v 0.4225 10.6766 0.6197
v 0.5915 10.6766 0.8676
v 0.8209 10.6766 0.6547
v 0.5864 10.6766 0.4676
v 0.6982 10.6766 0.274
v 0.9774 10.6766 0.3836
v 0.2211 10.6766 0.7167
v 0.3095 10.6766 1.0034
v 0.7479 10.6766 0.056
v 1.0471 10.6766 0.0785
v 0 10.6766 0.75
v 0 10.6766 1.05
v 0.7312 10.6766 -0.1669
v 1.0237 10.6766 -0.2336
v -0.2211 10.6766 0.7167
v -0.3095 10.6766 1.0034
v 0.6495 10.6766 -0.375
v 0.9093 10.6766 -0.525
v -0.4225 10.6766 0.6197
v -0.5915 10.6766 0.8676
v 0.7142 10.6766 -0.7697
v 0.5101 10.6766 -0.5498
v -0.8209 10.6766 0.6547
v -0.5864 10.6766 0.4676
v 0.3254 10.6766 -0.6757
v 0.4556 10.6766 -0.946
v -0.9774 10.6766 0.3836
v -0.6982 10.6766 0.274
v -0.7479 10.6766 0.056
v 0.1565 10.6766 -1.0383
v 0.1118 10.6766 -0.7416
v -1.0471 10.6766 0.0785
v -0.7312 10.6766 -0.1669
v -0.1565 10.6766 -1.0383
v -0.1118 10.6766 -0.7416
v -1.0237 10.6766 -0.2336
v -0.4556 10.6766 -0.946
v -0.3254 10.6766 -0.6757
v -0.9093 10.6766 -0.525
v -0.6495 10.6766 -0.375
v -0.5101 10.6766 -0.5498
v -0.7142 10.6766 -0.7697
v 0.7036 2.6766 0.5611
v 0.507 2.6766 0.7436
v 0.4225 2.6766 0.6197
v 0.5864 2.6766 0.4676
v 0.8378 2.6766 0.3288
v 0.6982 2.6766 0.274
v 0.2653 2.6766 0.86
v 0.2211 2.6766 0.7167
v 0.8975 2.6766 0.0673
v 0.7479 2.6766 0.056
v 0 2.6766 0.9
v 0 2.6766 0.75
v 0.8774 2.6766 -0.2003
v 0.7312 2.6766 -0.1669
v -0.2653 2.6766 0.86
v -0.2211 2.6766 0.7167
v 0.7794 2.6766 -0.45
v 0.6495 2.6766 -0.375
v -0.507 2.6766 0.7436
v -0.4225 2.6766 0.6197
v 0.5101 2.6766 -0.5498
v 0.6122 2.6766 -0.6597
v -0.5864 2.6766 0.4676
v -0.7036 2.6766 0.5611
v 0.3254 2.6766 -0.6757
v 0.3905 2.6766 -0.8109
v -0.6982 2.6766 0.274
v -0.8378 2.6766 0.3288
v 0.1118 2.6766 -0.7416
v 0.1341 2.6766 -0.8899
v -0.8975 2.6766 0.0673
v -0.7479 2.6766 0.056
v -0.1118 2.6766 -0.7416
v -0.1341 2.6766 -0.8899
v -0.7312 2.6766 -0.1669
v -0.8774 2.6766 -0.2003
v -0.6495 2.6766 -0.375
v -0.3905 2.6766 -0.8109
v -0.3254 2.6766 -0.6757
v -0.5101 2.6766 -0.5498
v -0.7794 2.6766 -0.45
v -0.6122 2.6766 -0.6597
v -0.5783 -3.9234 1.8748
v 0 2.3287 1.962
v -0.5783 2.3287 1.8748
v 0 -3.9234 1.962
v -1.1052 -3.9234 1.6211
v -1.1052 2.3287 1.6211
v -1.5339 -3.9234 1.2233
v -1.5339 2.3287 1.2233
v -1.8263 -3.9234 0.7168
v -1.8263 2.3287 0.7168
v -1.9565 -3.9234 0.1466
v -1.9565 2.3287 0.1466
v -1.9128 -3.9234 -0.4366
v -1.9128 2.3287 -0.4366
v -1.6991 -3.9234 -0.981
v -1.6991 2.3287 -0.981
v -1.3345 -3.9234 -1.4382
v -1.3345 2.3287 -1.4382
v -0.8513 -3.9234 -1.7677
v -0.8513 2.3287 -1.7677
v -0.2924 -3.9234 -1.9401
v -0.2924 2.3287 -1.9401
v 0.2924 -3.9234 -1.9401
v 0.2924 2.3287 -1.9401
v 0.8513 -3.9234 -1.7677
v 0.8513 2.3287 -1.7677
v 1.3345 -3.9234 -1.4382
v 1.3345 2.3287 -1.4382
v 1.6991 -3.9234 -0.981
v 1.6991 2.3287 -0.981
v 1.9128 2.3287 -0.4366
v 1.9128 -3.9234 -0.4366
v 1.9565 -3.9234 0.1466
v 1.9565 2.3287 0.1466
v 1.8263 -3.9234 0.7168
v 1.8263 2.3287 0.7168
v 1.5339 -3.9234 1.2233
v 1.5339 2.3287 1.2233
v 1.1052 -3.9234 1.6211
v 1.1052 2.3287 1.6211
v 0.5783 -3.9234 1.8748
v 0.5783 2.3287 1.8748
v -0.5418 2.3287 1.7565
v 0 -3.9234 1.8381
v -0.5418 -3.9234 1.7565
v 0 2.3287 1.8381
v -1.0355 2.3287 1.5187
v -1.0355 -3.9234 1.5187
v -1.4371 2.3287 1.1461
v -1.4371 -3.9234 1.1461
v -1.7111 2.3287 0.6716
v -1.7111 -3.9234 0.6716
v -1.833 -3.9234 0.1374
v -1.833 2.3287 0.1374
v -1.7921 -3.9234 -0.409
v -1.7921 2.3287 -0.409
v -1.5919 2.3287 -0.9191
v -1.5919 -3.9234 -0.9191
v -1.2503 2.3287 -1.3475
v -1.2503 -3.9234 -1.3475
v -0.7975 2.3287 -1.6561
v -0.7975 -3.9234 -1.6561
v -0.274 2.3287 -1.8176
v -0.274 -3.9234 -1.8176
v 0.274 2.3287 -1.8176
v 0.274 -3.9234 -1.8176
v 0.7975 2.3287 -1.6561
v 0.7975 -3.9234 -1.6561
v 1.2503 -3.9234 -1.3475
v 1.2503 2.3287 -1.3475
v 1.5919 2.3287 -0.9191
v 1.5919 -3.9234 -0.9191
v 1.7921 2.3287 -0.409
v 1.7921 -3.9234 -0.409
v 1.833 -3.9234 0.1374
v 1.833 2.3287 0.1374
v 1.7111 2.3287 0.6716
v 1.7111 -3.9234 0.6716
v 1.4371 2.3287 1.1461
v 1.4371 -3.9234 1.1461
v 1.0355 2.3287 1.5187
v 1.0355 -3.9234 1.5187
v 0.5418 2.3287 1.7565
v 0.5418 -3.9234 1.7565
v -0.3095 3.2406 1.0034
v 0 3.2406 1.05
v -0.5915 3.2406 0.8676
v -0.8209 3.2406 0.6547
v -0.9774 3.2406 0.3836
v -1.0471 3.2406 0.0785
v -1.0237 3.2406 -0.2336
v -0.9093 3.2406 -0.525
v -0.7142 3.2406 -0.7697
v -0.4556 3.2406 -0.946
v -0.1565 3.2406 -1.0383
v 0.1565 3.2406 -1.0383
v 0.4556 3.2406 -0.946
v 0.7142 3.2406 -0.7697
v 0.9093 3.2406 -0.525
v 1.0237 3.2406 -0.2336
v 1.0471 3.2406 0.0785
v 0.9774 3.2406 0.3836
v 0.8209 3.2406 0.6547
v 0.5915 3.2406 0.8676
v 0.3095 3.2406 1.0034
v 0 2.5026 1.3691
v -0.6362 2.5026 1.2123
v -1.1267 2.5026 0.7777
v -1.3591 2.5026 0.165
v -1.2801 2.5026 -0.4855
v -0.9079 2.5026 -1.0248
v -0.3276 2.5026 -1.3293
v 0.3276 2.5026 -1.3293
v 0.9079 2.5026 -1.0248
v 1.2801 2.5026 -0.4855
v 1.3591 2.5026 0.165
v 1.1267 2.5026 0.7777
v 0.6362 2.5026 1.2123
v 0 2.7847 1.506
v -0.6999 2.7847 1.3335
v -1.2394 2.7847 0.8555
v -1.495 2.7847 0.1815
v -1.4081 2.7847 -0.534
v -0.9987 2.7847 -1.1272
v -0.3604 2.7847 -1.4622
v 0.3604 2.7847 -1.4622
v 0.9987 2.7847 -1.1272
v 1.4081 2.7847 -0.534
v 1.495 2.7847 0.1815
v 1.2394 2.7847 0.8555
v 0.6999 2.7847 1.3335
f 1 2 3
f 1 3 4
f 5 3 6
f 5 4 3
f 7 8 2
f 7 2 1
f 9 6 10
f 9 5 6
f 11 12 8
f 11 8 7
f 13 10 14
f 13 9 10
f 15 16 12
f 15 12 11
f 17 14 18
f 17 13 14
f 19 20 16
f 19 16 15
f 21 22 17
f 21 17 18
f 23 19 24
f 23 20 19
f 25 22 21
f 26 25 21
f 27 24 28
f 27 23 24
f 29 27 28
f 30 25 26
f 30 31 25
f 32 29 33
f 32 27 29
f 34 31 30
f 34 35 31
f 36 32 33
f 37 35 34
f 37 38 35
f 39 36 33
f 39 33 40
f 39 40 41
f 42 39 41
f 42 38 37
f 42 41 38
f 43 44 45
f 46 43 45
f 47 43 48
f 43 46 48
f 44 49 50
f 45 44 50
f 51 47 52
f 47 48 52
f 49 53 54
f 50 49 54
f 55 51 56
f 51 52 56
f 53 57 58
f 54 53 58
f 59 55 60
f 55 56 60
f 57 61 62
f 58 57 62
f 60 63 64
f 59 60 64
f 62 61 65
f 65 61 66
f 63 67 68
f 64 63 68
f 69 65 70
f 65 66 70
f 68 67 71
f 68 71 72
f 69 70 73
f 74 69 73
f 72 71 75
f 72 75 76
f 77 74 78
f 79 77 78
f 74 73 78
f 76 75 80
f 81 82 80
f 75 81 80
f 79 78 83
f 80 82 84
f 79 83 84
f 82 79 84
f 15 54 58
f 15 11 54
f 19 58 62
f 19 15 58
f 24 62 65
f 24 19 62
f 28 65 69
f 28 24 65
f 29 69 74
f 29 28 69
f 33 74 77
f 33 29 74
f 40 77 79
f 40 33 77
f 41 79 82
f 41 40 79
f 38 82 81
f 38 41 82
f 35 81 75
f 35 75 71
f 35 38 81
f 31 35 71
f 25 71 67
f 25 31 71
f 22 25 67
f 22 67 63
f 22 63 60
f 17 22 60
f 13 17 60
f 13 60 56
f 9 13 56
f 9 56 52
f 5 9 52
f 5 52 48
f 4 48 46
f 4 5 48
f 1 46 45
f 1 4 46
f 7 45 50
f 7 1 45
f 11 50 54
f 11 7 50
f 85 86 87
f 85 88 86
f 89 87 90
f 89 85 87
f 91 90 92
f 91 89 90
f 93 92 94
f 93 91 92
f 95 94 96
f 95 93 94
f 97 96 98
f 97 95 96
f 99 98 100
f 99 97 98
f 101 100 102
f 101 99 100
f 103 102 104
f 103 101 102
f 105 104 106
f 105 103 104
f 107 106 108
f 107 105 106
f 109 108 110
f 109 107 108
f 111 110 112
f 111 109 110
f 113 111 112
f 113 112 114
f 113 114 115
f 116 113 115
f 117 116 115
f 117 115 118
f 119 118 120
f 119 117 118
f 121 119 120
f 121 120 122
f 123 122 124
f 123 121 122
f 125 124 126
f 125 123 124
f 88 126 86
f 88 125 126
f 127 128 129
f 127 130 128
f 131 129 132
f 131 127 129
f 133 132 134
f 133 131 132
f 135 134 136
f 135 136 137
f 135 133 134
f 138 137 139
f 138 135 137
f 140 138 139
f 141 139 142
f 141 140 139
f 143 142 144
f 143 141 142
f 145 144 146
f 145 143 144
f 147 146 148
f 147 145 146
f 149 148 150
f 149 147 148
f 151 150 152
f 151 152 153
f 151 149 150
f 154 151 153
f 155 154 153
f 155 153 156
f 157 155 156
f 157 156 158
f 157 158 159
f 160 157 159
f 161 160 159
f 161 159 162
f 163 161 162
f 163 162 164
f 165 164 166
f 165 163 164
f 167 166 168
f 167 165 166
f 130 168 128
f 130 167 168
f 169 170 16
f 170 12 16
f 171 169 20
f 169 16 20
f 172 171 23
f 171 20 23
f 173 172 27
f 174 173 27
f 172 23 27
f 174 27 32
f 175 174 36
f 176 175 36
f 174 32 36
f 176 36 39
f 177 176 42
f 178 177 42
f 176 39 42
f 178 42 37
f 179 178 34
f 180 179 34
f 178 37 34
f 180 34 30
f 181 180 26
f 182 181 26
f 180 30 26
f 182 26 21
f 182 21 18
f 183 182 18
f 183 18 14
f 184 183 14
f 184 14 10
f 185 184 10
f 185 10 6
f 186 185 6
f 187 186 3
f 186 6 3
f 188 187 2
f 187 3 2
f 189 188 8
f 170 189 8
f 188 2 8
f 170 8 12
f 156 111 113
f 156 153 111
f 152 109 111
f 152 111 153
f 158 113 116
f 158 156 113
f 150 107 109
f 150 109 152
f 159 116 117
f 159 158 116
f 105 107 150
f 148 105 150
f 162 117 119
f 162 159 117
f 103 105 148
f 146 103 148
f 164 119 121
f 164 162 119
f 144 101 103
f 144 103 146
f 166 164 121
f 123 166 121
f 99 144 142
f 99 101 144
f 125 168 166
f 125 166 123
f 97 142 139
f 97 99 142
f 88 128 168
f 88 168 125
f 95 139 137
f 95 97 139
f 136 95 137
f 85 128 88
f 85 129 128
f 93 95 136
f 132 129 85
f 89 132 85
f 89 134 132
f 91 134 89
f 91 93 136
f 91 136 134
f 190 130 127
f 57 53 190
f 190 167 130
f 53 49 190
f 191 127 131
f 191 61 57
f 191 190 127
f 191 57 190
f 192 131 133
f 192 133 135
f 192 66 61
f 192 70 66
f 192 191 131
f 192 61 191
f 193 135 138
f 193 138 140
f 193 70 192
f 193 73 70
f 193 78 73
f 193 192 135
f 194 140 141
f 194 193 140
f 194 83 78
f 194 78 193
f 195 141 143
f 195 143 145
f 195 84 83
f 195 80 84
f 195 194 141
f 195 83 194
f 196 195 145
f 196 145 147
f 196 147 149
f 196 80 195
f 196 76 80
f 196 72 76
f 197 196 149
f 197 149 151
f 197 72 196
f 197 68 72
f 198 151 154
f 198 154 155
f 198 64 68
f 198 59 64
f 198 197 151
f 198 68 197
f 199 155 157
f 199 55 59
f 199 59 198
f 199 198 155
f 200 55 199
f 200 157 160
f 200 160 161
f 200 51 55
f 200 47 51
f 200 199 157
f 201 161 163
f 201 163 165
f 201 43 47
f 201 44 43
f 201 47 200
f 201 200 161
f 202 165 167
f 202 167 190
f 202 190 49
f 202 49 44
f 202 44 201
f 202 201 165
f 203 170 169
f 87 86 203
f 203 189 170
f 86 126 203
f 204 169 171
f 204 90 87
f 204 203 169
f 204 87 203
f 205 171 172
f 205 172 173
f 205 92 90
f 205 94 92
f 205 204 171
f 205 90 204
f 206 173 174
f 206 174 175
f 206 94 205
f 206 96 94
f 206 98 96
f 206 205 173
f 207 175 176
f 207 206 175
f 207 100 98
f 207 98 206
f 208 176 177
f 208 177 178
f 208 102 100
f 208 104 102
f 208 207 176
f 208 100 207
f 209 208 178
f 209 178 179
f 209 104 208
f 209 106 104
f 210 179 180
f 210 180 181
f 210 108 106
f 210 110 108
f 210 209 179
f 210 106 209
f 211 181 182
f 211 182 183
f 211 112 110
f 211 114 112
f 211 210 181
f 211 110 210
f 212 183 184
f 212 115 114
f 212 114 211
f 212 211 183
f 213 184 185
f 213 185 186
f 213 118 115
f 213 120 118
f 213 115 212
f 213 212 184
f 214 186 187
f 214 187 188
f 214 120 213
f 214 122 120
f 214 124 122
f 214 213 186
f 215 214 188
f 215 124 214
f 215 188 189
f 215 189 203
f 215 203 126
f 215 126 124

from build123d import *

# Parameters (mm, degrees)
SKETCH2_W = 0.3
SKETCH2_H = 8


with BuildPart() as part:
    # Sketch3 → Revolve1 (revolve)
    with BuildSketch(Plane.XY):
        Polygon((0.9, 2.676607812), (1.05, 2.676607812), (1.05, 3.240637489), (1.96196636, 2.328671129), (1.96196636, -3.923392188), (1.838146931, -3.923392188), (1.838146931, 2.328671129), align=None)
    revolve(axis=Axis((0, 19.759006236, 0), (0, -1, 0)))

    # Sketch2 → Revolve2 (revolve)
    with BuildSketch(Plane.XY):
        with Locations((0.9, 6.676607812)):
            Rectangle(SKETCH2_W, SKETCH2_H)
    revolve(axis=Axis((0, 19.759006236, 0), (0, -1, 0)))


solid = part.part
